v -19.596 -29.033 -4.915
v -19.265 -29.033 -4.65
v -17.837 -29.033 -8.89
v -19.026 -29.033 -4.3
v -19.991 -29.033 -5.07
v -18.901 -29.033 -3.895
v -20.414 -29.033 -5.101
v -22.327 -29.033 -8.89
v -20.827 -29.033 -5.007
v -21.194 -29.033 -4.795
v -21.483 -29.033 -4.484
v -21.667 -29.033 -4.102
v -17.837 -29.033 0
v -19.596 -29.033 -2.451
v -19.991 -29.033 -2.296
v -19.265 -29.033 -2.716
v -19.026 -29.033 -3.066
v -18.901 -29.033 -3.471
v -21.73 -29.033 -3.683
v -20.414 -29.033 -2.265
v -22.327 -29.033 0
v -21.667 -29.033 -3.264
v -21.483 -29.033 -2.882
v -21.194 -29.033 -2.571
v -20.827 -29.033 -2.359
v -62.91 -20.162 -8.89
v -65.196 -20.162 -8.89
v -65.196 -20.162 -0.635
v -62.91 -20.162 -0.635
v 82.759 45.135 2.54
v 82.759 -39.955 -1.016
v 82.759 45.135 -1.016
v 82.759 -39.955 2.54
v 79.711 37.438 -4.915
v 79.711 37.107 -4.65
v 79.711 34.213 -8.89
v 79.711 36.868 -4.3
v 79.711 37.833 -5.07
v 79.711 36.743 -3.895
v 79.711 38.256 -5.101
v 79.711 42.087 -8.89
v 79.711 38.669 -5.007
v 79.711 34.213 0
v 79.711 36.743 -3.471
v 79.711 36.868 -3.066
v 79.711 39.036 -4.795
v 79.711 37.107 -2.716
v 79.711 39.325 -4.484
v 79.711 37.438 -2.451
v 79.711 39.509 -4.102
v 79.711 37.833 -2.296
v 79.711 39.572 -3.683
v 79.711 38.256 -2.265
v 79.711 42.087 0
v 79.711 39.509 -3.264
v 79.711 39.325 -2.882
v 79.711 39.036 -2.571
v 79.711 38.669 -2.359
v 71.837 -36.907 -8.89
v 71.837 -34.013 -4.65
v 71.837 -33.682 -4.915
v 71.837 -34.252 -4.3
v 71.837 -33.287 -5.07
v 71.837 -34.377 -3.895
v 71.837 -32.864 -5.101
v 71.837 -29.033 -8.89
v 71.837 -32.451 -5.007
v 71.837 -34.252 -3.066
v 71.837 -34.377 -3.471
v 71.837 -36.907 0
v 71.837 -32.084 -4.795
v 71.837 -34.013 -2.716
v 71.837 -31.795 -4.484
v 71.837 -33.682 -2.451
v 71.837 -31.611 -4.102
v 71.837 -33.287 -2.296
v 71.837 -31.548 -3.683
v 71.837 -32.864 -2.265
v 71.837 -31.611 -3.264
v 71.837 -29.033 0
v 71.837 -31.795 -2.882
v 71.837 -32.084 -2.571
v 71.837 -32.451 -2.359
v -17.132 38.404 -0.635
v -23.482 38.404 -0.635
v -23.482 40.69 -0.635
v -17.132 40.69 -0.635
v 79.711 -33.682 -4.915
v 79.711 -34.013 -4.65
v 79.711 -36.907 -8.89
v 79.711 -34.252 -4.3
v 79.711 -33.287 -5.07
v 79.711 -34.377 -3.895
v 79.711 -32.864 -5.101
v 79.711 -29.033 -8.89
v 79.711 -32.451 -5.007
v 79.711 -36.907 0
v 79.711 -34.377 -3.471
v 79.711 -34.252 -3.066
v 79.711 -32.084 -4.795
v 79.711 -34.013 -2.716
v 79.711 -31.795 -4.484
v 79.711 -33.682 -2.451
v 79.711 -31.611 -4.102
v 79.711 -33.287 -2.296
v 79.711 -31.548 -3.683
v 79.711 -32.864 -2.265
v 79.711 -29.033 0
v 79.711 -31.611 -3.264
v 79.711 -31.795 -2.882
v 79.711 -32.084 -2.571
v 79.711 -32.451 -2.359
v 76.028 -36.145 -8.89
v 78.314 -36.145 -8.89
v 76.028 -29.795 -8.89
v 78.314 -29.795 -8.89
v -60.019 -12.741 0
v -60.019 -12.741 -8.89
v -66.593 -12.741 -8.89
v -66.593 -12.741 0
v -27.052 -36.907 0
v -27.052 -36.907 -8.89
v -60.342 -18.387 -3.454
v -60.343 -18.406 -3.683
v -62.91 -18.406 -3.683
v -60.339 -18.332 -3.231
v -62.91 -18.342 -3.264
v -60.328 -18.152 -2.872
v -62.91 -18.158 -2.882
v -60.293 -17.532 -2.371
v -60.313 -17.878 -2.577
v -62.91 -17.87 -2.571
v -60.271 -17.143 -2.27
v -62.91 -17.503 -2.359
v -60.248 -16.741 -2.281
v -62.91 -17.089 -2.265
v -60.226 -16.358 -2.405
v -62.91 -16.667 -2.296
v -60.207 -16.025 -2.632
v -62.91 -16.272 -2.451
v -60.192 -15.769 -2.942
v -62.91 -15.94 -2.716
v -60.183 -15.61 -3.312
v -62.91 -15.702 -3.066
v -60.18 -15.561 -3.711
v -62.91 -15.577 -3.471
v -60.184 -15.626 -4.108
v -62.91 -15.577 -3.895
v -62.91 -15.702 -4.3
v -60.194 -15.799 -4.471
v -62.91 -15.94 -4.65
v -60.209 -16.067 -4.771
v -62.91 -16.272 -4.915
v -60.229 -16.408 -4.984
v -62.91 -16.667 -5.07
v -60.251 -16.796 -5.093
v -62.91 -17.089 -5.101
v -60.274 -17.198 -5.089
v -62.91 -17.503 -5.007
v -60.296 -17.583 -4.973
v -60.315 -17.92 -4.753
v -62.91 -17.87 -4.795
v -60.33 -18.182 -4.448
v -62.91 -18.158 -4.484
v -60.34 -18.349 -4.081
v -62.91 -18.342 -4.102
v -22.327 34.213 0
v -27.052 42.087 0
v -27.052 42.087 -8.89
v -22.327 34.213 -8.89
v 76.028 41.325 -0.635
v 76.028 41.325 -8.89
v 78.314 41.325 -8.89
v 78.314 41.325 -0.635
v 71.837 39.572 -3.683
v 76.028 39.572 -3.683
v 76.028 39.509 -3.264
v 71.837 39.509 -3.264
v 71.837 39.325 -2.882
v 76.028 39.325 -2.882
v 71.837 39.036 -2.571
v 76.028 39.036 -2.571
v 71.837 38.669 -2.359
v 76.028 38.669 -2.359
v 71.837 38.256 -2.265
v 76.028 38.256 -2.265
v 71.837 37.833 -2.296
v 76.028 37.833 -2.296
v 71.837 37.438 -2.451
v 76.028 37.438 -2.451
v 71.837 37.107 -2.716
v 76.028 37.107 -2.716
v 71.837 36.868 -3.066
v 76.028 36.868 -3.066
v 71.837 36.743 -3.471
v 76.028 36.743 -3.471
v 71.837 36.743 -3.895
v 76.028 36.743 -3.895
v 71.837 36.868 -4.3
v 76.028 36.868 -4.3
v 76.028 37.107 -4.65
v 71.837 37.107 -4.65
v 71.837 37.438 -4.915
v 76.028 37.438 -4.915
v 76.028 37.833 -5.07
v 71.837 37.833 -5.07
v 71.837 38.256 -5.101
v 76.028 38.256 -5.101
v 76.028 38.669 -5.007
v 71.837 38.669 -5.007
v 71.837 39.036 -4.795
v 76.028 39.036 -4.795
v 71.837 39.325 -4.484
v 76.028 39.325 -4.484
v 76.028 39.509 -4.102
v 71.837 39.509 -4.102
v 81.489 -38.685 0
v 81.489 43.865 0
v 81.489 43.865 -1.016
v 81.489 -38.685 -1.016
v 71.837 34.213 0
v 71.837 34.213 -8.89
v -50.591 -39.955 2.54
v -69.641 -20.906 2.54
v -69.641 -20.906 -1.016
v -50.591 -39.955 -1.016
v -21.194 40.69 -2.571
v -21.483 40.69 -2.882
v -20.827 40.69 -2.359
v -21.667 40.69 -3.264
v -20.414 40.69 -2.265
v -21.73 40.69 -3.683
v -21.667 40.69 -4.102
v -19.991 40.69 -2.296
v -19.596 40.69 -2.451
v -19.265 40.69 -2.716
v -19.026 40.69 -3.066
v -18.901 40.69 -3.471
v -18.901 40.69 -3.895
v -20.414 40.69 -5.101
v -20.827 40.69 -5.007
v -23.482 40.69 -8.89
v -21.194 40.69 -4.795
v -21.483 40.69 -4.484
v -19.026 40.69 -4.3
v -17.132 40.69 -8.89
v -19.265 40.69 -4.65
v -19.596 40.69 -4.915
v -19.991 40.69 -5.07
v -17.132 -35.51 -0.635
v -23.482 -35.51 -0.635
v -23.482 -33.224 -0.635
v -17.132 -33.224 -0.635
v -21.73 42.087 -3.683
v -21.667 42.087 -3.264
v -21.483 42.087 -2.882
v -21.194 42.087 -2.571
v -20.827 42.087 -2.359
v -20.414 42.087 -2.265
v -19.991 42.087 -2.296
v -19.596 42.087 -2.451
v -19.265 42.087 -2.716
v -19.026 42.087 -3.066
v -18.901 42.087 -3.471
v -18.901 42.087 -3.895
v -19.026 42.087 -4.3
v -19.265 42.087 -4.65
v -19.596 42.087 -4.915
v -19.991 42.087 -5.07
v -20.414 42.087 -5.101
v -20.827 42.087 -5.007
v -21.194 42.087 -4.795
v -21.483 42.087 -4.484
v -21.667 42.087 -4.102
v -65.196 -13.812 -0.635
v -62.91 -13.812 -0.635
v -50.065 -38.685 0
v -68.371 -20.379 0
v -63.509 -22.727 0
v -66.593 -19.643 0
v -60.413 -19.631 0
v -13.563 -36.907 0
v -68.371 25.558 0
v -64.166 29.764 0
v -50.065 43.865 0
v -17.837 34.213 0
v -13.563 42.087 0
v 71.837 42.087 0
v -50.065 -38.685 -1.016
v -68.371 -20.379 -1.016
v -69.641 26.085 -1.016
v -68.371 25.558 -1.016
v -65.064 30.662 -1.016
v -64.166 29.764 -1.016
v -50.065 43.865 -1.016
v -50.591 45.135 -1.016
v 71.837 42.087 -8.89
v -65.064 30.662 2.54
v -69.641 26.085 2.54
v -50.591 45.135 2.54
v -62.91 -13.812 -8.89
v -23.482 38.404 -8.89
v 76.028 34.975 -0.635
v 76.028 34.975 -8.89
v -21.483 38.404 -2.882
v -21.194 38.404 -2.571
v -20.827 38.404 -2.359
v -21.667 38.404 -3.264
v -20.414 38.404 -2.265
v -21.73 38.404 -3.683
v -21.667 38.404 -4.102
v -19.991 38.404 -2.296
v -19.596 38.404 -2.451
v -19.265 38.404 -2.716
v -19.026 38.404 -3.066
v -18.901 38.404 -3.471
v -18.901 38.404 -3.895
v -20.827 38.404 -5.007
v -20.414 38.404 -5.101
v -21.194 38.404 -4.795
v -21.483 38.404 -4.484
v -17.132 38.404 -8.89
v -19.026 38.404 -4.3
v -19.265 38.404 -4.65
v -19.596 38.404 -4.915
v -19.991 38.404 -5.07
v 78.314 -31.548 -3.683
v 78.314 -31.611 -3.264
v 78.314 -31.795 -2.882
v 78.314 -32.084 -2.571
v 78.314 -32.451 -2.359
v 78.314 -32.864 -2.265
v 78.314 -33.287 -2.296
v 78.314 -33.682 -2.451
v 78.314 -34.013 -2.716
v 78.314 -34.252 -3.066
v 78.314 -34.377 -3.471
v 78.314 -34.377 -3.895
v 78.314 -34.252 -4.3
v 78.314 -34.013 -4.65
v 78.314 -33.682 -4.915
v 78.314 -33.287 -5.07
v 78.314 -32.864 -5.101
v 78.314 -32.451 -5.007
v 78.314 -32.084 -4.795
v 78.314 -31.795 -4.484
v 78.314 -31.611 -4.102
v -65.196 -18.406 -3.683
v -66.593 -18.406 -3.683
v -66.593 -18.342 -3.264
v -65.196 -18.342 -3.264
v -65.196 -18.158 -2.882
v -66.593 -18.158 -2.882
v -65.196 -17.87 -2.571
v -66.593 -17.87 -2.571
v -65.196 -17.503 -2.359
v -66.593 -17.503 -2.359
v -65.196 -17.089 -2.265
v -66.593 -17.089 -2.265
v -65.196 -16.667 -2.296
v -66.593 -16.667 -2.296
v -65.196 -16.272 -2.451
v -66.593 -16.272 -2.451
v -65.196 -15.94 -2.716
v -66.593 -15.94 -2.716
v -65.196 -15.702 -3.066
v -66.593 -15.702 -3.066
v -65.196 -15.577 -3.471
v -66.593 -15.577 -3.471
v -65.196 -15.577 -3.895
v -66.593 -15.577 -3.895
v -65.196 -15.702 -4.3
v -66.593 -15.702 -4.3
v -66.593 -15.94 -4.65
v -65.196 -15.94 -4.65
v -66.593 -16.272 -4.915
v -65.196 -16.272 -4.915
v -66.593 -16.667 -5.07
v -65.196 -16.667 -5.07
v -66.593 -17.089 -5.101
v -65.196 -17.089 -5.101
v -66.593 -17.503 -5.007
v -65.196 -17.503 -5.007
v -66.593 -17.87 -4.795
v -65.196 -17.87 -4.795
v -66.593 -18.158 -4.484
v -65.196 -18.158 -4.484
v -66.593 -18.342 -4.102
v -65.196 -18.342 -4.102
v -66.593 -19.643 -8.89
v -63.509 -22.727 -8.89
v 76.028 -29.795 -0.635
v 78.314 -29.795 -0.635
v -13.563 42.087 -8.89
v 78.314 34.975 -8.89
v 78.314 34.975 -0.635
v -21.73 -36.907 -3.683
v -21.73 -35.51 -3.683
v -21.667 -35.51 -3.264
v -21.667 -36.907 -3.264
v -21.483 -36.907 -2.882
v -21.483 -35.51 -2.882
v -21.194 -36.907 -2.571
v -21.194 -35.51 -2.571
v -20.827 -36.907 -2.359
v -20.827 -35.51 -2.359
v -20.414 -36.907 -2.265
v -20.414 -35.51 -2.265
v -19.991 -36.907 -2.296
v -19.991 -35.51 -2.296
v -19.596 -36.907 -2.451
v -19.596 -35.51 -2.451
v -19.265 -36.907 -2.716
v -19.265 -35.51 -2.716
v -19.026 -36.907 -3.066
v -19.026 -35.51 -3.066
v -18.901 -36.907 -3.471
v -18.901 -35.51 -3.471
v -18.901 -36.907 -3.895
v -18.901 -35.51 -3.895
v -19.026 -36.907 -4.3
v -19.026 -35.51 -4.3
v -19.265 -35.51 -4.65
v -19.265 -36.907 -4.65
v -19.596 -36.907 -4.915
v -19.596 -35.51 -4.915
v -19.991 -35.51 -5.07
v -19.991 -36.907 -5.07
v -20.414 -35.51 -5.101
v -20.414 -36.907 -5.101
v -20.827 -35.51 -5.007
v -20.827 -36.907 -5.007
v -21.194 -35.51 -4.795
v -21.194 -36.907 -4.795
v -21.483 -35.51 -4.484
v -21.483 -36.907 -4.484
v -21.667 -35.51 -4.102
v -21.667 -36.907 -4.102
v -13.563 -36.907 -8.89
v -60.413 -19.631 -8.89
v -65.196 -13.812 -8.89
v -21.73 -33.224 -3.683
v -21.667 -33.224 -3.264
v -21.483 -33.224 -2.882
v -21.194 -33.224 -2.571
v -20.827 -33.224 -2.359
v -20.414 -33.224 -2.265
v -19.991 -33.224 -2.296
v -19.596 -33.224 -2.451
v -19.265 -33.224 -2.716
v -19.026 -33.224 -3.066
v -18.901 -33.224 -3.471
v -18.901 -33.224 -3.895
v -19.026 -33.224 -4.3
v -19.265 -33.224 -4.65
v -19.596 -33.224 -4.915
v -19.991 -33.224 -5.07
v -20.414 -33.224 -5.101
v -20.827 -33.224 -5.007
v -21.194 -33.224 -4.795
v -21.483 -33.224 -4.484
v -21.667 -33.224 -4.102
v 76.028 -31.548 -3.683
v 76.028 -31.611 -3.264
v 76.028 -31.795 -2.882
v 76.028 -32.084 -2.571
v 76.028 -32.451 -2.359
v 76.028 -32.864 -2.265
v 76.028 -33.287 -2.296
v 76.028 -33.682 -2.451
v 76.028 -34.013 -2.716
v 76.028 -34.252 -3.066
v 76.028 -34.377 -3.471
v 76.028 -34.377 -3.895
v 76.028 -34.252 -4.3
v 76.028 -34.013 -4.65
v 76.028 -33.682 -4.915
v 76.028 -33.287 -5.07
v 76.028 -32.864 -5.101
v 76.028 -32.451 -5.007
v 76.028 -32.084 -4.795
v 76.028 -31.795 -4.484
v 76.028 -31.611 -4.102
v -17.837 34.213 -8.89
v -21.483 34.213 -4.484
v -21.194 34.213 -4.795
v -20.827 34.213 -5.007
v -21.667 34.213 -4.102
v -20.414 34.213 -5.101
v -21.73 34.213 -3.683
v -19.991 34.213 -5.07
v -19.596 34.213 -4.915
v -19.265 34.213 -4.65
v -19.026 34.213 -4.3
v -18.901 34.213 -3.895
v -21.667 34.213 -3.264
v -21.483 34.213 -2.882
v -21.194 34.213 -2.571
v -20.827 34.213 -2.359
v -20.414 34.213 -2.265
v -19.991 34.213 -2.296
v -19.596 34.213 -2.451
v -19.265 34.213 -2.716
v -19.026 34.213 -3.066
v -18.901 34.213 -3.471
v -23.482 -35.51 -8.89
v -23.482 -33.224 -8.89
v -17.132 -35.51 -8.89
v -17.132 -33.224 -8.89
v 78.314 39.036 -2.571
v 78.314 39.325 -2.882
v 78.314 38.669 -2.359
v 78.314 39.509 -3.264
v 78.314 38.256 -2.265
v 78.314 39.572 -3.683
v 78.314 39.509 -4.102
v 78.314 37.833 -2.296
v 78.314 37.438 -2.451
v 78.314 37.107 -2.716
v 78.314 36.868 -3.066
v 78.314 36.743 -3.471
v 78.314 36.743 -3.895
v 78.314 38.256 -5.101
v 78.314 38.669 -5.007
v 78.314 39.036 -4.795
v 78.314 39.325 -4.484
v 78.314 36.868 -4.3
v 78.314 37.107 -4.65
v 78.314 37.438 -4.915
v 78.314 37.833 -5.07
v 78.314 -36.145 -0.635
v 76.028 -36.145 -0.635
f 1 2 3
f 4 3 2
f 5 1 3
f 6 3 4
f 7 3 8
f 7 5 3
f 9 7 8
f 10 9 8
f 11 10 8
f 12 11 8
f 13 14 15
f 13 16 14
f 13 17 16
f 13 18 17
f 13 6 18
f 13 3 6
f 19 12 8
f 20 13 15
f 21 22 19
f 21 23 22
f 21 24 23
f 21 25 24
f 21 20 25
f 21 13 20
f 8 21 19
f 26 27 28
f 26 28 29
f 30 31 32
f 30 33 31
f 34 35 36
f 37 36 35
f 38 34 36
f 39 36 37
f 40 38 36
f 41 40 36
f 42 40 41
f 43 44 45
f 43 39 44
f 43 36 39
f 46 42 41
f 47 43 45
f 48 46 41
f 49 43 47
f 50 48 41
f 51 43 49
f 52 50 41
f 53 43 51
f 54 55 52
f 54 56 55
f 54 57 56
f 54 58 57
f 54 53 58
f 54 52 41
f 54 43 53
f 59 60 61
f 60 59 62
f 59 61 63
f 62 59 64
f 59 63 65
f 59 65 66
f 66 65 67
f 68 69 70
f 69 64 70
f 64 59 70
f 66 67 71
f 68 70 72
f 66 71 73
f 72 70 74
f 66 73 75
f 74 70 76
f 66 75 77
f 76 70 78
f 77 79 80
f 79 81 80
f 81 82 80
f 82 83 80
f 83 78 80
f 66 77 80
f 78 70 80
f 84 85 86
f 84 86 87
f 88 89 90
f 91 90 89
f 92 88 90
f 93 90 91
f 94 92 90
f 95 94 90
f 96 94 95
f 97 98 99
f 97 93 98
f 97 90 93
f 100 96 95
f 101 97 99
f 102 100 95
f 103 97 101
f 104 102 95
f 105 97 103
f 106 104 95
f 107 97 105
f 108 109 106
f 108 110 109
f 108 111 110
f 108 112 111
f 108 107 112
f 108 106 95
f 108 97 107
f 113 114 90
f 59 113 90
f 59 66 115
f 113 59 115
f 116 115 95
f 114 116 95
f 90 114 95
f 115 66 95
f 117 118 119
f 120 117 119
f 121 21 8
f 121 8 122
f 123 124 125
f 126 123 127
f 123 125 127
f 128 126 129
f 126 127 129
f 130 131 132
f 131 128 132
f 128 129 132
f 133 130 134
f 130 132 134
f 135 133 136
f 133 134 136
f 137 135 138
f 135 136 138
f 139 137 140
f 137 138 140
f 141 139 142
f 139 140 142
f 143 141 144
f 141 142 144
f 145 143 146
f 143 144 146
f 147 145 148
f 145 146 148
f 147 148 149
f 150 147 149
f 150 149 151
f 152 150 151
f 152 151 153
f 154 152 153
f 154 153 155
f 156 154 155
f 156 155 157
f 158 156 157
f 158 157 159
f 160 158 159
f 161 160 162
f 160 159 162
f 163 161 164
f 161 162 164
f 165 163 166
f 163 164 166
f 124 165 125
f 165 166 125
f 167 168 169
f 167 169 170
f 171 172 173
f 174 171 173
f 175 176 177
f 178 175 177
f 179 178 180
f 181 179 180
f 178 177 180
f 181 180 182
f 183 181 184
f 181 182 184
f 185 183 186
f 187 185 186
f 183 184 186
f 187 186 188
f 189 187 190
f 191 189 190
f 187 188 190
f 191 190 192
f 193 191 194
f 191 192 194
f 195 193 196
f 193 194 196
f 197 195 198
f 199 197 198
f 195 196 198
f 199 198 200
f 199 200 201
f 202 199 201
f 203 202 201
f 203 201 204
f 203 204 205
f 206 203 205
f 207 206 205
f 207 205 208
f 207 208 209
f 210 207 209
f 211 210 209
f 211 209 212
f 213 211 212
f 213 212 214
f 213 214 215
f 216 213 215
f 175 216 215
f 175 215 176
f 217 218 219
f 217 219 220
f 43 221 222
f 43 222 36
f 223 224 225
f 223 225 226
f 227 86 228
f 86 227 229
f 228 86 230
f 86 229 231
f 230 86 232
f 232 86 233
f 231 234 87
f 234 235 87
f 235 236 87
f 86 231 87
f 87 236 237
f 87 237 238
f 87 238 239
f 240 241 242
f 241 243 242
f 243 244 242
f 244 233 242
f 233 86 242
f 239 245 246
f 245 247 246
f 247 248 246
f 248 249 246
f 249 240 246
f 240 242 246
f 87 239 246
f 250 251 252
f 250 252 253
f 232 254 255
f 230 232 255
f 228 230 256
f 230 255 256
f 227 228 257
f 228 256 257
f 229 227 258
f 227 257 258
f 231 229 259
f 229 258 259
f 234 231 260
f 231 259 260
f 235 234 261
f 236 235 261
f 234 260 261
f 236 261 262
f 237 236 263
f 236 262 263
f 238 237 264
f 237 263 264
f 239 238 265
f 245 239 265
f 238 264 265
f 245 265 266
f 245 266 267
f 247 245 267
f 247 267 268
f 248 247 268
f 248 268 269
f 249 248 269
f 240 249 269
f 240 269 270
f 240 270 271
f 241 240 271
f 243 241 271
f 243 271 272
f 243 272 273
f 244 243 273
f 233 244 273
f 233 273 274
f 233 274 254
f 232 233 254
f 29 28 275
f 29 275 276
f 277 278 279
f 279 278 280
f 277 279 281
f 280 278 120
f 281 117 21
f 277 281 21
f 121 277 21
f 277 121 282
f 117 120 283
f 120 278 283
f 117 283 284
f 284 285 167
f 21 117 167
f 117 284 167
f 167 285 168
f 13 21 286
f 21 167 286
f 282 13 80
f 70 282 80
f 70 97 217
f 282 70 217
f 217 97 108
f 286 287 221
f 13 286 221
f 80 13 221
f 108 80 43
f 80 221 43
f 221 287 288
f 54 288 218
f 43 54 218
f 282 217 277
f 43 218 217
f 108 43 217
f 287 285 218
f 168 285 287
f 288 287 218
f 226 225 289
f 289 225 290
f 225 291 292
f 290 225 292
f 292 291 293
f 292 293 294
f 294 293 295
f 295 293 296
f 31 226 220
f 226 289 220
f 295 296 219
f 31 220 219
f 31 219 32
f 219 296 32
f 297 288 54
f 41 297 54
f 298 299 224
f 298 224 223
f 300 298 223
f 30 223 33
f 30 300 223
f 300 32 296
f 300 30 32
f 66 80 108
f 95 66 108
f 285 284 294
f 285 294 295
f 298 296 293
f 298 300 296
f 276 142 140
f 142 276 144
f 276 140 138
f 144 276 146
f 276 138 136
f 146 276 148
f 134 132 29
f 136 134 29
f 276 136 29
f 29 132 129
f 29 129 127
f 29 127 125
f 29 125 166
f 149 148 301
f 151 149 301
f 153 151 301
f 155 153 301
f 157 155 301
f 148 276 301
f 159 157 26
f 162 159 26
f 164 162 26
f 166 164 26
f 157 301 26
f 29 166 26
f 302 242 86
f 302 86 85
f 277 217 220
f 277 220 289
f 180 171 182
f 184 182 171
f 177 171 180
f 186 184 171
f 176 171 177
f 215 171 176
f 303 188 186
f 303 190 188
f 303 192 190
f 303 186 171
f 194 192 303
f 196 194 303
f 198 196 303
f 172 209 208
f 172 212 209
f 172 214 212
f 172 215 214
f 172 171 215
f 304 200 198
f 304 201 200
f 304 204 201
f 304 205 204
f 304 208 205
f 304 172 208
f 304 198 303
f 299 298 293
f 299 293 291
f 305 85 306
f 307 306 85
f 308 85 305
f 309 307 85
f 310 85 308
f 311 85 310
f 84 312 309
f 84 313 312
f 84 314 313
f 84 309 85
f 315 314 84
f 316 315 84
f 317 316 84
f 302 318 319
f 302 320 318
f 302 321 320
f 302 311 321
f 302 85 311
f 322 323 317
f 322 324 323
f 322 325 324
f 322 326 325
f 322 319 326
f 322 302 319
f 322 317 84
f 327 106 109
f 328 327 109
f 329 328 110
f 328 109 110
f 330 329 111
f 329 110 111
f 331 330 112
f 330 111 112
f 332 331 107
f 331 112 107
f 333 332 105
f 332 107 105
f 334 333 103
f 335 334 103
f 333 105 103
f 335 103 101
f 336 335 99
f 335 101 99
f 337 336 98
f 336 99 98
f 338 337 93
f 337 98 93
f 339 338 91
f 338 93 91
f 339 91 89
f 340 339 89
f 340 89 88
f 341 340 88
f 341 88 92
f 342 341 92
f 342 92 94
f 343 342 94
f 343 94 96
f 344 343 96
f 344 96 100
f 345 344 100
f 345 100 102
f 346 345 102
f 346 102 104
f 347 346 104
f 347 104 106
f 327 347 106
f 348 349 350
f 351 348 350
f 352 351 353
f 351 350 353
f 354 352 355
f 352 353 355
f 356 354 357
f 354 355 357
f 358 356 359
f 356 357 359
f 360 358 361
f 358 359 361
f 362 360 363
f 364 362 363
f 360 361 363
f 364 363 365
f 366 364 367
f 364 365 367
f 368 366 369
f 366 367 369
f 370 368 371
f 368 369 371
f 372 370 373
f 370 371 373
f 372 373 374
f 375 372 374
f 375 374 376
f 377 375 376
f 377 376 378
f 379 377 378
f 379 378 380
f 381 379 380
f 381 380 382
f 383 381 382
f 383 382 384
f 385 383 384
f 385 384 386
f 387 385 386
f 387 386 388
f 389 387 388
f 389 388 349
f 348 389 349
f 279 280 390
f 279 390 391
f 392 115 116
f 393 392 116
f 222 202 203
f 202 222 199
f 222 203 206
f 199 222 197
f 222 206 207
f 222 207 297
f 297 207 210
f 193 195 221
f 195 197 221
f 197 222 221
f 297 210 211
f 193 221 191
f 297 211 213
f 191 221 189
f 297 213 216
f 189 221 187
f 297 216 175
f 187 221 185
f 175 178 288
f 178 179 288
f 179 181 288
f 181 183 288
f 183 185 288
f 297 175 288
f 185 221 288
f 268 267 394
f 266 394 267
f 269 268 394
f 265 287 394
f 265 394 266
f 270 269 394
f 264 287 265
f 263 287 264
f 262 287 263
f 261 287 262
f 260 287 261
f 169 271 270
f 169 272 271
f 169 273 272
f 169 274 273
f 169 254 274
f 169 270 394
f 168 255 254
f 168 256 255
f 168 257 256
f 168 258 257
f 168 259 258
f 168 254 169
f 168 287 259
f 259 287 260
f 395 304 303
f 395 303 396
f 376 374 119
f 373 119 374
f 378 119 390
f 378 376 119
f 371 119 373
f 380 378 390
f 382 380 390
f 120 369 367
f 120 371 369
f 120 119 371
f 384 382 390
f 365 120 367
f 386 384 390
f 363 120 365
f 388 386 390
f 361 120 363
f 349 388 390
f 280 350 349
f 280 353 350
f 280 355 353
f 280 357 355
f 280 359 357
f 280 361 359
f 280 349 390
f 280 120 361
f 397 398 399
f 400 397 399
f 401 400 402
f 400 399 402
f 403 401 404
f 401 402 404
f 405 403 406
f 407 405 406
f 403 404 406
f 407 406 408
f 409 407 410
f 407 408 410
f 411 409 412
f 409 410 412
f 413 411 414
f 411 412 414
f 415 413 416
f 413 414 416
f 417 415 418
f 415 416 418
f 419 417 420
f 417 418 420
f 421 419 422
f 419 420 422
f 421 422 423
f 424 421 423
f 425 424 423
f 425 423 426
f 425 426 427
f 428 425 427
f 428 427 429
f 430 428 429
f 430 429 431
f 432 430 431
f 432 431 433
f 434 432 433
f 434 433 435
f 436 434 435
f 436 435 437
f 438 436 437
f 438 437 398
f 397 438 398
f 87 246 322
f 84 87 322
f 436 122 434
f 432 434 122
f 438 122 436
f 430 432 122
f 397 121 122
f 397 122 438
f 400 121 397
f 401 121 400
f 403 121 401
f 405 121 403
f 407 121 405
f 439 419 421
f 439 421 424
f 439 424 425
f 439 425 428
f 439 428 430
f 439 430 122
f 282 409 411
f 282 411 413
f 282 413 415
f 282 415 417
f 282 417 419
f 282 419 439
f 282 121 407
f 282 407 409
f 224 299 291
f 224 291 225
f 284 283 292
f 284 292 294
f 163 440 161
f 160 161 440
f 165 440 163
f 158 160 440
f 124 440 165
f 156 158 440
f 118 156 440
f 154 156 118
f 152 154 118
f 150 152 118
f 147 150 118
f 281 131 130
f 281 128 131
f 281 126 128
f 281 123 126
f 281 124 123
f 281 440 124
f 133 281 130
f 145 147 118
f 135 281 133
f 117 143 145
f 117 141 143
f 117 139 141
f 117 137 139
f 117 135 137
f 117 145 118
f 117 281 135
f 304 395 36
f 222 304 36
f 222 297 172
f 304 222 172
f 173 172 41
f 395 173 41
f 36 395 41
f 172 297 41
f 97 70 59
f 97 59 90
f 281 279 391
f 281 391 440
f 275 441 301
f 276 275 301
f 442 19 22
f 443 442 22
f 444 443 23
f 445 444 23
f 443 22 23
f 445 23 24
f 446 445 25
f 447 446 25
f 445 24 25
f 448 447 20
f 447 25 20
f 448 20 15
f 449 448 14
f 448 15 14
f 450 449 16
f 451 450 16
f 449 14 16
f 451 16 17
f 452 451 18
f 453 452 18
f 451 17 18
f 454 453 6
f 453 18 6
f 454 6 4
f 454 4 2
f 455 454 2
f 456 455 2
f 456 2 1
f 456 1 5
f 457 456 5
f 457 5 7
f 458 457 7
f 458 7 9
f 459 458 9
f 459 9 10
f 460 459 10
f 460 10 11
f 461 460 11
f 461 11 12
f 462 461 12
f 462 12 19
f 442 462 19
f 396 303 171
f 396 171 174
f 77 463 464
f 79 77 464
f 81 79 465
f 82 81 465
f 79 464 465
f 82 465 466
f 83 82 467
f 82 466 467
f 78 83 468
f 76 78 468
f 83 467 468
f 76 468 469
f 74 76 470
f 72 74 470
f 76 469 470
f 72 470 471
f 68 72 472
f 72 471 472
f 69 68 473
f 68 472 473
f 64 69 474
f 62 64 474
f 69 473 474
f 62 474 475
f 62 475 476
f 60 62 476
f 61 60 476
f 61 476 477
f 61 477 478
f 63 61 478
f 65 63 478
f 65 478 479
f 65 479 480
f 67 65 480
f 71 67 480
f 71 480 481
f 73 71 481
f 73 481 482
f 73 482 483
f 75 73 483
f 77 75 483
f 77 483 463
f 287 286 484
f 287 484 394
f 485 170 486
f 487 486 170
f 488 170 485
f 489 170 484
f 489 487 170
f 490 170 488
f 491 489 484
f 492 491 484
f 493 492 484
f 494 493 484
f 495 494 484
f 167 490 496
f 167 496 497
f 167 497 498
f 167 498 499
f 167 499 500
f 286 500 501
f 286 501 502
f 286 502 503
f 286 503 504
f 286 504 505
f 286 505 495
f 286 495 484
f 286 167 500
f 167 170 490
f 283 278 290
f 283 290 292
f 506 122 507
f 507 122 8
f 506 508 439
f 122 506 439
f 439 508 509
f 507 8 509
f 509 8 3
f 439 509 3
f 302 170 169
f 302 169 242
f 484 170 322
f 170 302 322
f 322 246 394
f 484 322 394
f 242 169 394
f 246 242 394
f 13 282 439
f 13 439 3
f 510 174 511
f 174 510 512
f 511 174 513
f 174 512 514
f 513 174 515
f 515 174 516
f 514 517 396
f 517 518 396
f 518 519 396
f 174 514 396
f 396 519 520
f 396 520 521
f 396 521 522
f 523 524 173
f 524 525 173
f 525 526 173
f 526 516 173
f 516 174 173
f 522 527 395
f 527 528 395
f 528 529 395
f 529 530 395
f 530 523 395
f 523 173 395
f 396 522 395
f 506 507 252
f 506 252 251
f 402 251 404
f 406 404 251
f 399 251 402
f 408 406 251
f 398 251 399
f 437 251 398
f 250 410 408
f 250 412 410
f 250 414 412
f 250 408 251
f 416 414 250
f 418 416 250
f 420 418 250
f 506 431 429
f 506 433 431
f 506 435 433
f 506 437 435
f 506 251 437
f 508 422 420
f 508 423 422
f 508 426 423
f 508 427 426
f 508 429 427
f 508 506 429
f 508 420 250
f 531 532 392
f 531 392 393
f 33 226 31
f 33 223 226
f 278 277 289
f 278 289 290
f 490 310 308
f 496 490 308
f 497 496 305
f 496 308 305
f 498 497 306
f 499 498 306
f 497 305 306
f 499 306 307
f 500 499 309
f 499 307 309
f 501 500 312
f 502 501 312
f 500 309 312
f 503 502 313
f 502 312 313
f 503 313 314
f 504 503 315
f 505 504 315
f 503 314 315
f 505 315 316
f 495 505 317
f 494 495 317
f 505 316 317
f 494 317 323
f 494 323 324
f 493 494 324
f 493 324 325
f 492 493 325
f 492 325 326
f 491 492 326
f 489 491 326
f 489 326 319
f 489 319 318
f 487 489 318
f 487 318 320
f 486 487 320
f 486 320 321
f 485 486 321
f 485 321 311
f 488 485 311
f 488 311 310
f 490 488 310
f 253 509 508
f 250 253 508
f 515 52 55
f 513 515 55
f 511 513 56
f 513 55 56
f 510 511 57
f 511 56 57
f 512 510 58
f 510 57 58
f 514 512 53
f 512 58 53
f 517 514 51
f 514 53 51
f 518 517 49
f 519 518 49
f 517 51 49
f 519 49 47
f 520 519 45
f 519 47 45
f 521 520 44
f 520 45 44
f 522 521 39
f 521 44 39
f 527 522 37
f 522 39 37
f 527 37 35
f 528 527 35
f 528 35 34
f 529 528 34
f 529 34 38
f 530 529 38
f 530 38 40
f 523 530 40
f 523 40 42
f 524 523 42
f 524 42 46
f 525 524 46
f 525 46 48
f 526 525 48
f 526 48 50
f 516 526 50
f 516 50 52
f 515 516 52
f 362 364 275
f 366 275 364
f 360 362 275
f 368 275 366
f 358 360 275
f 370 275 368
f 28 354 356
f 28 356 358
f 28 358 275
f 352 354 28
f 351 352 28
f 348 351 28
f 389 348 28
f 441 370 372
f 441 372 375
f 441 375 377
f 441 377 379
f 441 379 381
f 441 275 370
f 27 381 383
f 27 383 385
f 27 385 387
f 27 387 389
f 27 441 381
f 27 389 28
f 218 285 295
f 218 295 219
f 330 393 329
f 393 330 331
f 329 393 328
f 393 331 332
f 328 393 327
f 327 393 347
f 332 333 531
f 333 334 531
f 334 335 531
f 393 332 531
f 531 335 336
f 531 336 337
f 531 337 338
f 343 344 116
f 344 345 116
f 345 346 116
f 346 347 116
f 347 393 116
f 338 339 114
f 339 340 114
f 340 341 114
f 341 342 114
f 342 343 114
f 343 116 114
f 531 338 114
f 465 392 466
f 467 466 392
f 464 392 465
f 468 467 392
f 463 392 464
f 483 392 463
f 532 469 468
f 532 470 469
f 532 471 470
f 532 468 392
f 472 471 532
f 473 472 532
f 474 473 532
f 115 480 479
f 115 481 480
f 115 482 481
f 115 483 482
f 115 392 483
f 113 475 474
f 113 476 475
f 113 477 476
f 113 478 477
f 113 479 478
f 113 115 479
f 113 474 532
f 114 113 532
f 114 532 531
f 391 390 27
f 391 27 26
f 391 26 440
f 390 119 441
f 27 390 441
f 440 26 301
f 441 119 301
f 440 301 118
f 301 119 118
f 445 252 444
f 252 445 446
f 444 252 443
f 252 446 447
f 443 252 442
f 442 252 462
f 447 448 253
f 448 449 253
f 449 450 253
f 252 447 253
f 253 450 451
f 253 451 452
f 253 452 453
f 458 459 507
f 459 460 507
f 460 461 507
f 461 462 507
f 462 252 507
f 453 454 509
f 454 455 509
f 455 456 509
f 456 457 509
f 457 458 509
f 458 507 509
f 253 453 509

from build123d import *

# Parameters (mm, degrees)
F0_W      = 7.8739928325
F0_H      = 7.8739928325
F1_DEPTH  = 2.54
F2_DEPTH  = 1.016
F3_DEPTH  = 8.89
F8_W      = 2.286
F8_H      = 6.35
F7_W      = 2.286
F7_H      = 6.35
F4_W      = 6.35
F4_H      = 2.286
F5_W      = 2.286
F5_H      = 6.35
F6_W      = 6.35
F6_H      = 2.286
F9_DEPTH  = 8.255
F10_R     = 1.4224
F11_DEPTH = 101.6
F12_R     = 1.4224
F13_R     = 1.4224
F14_DEPTH = 25.4
F15_R     = 1.4224
F16_DEPTH = 25.4


# Not quite as in the source:
# - a feature names something its author has since deleted; it is built from what else it names


with BuildPart() as f1:
    # F0 (on Top) → F1 (new body)
    with BuildSketch(Plane.XY):
        Polygon((-50.5911594971, 45.1345390935), (-65.0638575705, 30.6618410202), (-69.6408525109, 26.0848460797), (-69.6408525109, 9.5127671957), (-69.6408525109, -20.9057678927), (-62.6880467633, -27.8585736403), (-50.5911594971, -39.9554609065), (82.7588405029, -39.9554609065), (82.7588405029, -17.0967224985), (82.7588405029, 43.8645390935), (82.7588405029, 45.1345390935), (33.1444106996, 45.1345390935), (-20.2568043023, 45.1345390935), align=None)
        Polygon((-50.0651082729, -38.6854609065), (-68.3711594971, -20.3794096823), (-68.3711594971, 25.5584878693), (-64.1658319583, 29.763815408), (-50.0651082729, 43.8645390935), (81.4888405029, 43.8645390935), (81.4888405029, -38.6854609065), align=None, mode=Mode.SUBTRACT)
        Polygon((-68.3711594971, 25.5584878693), (-68.3711594971, -20.3794096823), (-50.0651082729, -38.6854609065), (81.4888405029, -38.6854609065), (81.4888405029, 43.8645390935), (-50.0651082729, 43.8645390935), (-64.1658319583, 29.763815408), align=None)
        Polygon((-13.562855112, -36.9074608927), (-27.0518330949, -36.9074608927), (-22.3274411258, -29.0334609202), (-17.8373202542, -29.0334609202), align=None, mode=Mode.SUBTRACT)
        Polygon((-66.5931594971, -19.6429379684), (-66.5931594971, -12.7413552397), (-60.0190392027, -12.7413552397), (-60.413067775, -19.6310556945), (-63.509054773, -22.7270426925), align=None, mode=Mode.SUBTRACT)
        with BuildLine():
            Line((-49.5390570487, -37.4154609065), (-61.7130058245, -25.2415121307))
            Line((-61.7130058245, -25.2415121307), (-58.120903376, -21.6494096823))
            Line((-58.120903376, -21.6494096823), (-56.9411594971, -12.2333584581))
            Line((-56.9411594971, -12.2333584581), (-56.9411594971, -9.6933584581))
            Line((-56.9411594971, -9.6933584581), (-67.1011594971, -9.6933584581))
            Line((-67.1011594971, -9.6933584581), (-67.1011594971, 25.0324366451))
            Line((-67.1011594971, 25.0324366451), (-49.5390570487, 42.5945390935))
            Line((-49.5390570487, 42.5945390935), (-33.3653066841, 42.5945390935))
            ThreePointArc((-33.3653066841, 42.5945390935), (-30.8623950498, 41.9351536832), (-29.0092406655, 40.128174271))
            Line((-29.0092406655, 40.128174271), (-25.1550660971, 33.7045390935))
            ThreePointArc((-25.1550660971, 33.7045390935), (-23.284234992, 31.8649136199), (-20.7556570459, 31.1645390935))
            Line((-20.7556570459, 31.1645390935), (-19.3944751483, 31.1645390935))
            ThreePointArc((-19.3944751483, 31.1645390935), (-16.8544751483, 31.8451300423), (-14.9950660971, 33.7045390935))
            Line((-14.9950660971, 33.7045390935), (-11.6110890868, 39.9381692669))
            ThreePointArc((-11.6110890868, 39.9381692669), (-9.7440488814, 41.8802258253), (-7.1465155593, 42.5945390935))
            Line((-7.1465155593, 42.5945390935), (67.5188405029, 42.5945390935))
            ThreePointArc((67.5188405029, 42.5945390935), (69.3148917271, 41.8505903177), (70.0588405029, 40.0545390935))
            Line((70.0588405029, 40.0545390935), (70.0588405029, 32.4345390935))
            Line((70.0588405029, 32.4345390935), (77.6788405029, 32.4345390935))
            ThreePointArc((77.6788405029, 32.4345390935), (79.4748917271, 31.6905903177), (80.2188405029, 29.8945390935))
            Line((80.2188405029, 29.8945390935), (80.2188405029, -24.7154609065))
            ThreePointArc((80.2188405029, -24.7154609065), (79.4748917271, -26.5115121307), (77.6788405029, -27.2554609065))
            Line((77.6788405029, -27.2554609065), (70.0588405029, -27.2554609065))
            Line((70.0588405029, -27.2554609065), (70.0588405029, -34.8754609065))
            ThreePointArc((70.0588405029, -34.8754609065), (69.3148917271, -36.6715121307), (67.5188405029, -37.4154609065))
            Line((67.5188405029, -37.4154609065), (-7.1465155593, -37.4154609065))
            ThreePointArc((-7.1465155593, -37.4154609065), (-9.7440488814, -36.7011476383), (-11.6110890868, -34.7590910799))
            Line((-11.6110890868, -34.7590910799), (-14.9950660971, -28.5254609065))
            ThreePointArc((-14.9950660971, -28.5254609065), (-16.8544751483, -26.6660518553), (-19.3944751483, -25.9854609065))
            Line((-19.3944751483, -25.9854609065), (-20.7556570459, -25.9854609065))
            ThreePointArc((-20.7556570459, -25.9854609065), (-23.284234992, -26.6858354329), (-25.1550660971, -28.5254609065))
            Line((-25.1550660971, -28.5254609065), (-29.0092406655, -34.949096084))
            ThreePointArc((-29.0092406655, -34.949096084), (-30.8623950498, -36.7560754962), (-33.3653066841, -37.4154609065))
            Line((-33.3653066841, -37.4154609065), (-49.5390570487, -37.4154609065))
        make_face(mode=Mode.SUBTRACT)
        with Locations((75.7738405029, -32.9704609065)):
            Rectangle(F0_W, F0_H, mode=Mode.SUBTRACT)
        Polygon((-27.0518310596, 42.0865379274), (-13.5628570488, 42.0865379274), (-17.8373209399, 34.2125402596), (-22.3274404733, 34.2125402596), align=None, mode=Mode.SUBTRACT)
        with Locations((75.7738405029, 38.1495390935)):
            Rectangle(F0_W, F0_H, mode=Mode.SUBTRACT)
        with BuildLine():
            Line((-58.120903376, -21.6494096823), (-61.7130058245, -25.2415121307))
            Line((-61.7130058245, -25.2415121307), (-49.5390570487, -37.4154609065))
            Line((-49.5390570487, -37.4154609065), (-33.3653066841, -37.4154609065))
            ThreePointArc((-33.3653066841, -37.4154609065), (-30.8623950498, -36.7560754962), (-29.0092406655, -34.949096084))
            Line((-29.0092406655, -34.949096084), (-25.1550660971, -28.5254609065))
            ThreePointArc((-25.1550660971, -28.5254609065), (-23.284234992, -26.6858354329), (-20.7556570459, -25.9854609065))
            Line((-20.7556570459, -25.9854609065), (-19.3944751483, -25.9854609065))
            ThreePointArc((-19.3944751483, -25.9854609065), (-16.8544751483, -26.6660518553), (-14.9950660971, -28.5254609065))
            Line((-14.9950660971, -28.5254609065), (-11.6110890868, -34.7590910799))
            ThreePointArc((-11.6110890868, -34.7590910799), (-9.7440488814, -36.7011476383), (-7.1465155593, -37.4154609065))
            Line((-7.1465155593, -37.4154609065), (67.5188405029, -37.4154609065))
            ThreePointArc((67.5188405029, -37.4154609065), (69.3148917271, -36.6715121307), (70.0588405029, -34.8754609065))
            Line((70.0588405029, -34.8754609065), (70.0588405029, -27.2554609065))
            Line((70.0588405029, -27.2554609065), (77.6788405029, -27.2554609065))
            ThreePointArc((77.6788405029, -27.2554609065), (79.4748917271, -26.5115121307), (80.2188405029, -24.7154609065))
            Line((80.2188405029, -24.7154609065), (80.2188405029, 29.8945390935))
            ThreePointArc((80.2188405029, 29.8945390935), (79.4748917271, 31.6905903177), (77.6788405029, 32.4345390935))
            Line((77.6788405029, 32.4345390935), (70.0588405029, 32.4345390935))
            Line((70.0588405029, 32.4345390935), (70.0588405029, 40.0545390935))
            ThreePointArc((70.0588405029, 40.0545390935), (69.3148917271, 41.8505903177), (67.5188405029, 42.5945390935))
            Line((67.5188405029, 42.5945390935), (-7.1465155593, 42.5945390935))
            ThreePointArc((-7.1465155593, 42.5945390935), (-9.7440488814, 41.8802258253), (-11.6110890868, 39.9381692669))
            Line((-11.6110890868, 39.9381692669), (-14.9950660971, 33.7045390935))
            ThreePointArc((-14.9950660971, 33.7045390935), (-16.8544751483, 31.8451300423), (-19.3944751483, 31.1645390935))
            Line((-19.3944751483, 31.1645390935), (-20.7556570459, 31.1645390935))
            ThreePointArc((-20.7556570459, 31.1645390935), (-23.284234992, 31.8649136199), (-25.1550660971, 33.7045390935))
            Line((-25.1550660971, 33.7045390935), (-29.0092406655, 40.128174271))
            ThreePointArc((-29.0092406655, 40.128174271), (-30.8623950498, 41.9351536832), (-33.3653066841, 42.5945390935))
            Line((-33.3653066841, 42.5945390935), (-49.5390570487, 42.5945390935))
            Line((-49.5390570487, 42.5945390935), (-67.1011594971, 25.0324366451))
            Line((-67.1011594971, 25.0324366451), (-67.1011594971, -9.6933584581))
            Line((-67.1011594971, -9.6933584581), (-56.9411594971, -9.6933584581))
            Line((-56.9411594971, -9.6933584581), (-56.9411594971, -12.2333584581))
            Line((-56.9411594971, -12.2333584581), (-58.120903376, -21.6494096823))
        make_face()
        Polygon((-22.3274411258, -29.0334609202), (-27.0518330949, -36.9074608927), (-13.562855112, -36.9074608927), (-17.8373202542, -29.0334609202), align=None)
        Polygon((-17.8373209399, 34.2125402596), (-13.5628570488, 42.0865379274), (-27.0518310596, 42.0865379274), (-22.3274404733, 34.2125402596), align=None)
        with Locations((75.7738405029, -32.9704609065)):
            Rectangle(F0_W, F0_H)
        with Locations((75.7738405029, 38.1495390935)):
            Rectangle(F0_W, F0_H)
        Polygon((-60.0190392027, -12.7413552397), (-66.5931594971, -12.7413552397), (-66.5931594971, -19.6429379684), (-63.509054773, -22.7270426925), (-60.413067775, -19.6310556945), align=None)
    extrude(amount=F1_DEPTH)

    # F0 (on Top) → F2 (join)
    with BuildSketch(Plane.XY):
        Polygon((-50.5911594971, 45.1345390935), (-65.0638575705, 30.6618410202), (-69.6408525109, 26.0848460797), (-69.6408525109, 9.5127671957), (-69.6408525109, -20.9057678927), (-62.6880467633, -27.8585736403), (-50.5911594971, -39.9554609065), (82.7588405029, -39.9554609065), (82.7588405029, -17.0967224985), (82.7588405029, 43.8645390935), (82.7588405029, 45.1345390935), (33.1444106996, 45.1345390935), (-20.2568043023, 45.1345390935), align=None)
        Polygon((-50.0651082729, -38.6854609065), (-68.3711594971, -20.3794096823), (-68.3711594971, 25.5584878693), (-64.1658319583, 29.763815408), (-50.0651082729, 43.8645390935), (81.4888405029, 43.8645390935), (81.4888405029, -38.6854609065), align=None, mode=Mode.SUBTRACT)
    extrude(amount=-F2_DEPTH)

    # F0 (on Top) → F3 (join)
    with BuildSketch(Plane.XY):
        Polygon((-17.8373209399, 34.2125402596), (-13.5628570488, 42.0865379274), (-27.0518310596, 42.0865379274), (-22.3274404733, 34.2125402596), align=None)
        Polygon((-22.3274411258, -29.0334609202), (-27.0518330949, -36.9074608927), (-13.562855112, -36.9074608927), (-17.8373202542, -29.0334609202), align=None)
        Polygon((-60.0190392027, -12.7413552397), (-66.5931594971, -12.7413552397), (-66.5931594971, -19.6429379684), (-63.509054773, -22.7270426925), (-60.413067775, -19.6310556945), align=None)
        with Locations((75.7738405029, -32.9704609065)):
            Rectangle(F0_W, F0_H)
        with Locations((75.7738405029, 38.1495390935)):
            Rectangle(F0_W, F0_H)
    extrude(amount=-F3_DEPTH)

    # F8 (on face) + F7 (on face) + F4 (on face) + F5 (on face) + F6 (on face) → F9 (cut)
    with BuildSketch(Plane(origin=(0, 0, -8.89), x_dir=(1, 0, 0), z_dir=(0, 0, -1))):
        with Locations((77.1708369192, -38.1495390935)):
            Rectangle(F8_W, F8_H)
    with BuildSketch(Plane(origin=(0, 0, -8.89), x_dir=(1, 0, 0), z_dir=(0, 0, -1))):
        with Locations((77.1708369192, 32.9704609065)):
            Rectangle(F7_W, F7_H)
    with BuildSketch(Plane(origin=(0, 0, -8.89), x_dir=(1, 0, 0), z_dir=(0, 0, -1))):
        with Locations((-20.3073441034, 34.3674608927)):
            Rectangle(F4_W, F4_H)
    with BuildSketch(Plane(origin=(0, 0, -8.89), x_dir=(1, 0, 0), z_dir=(0, 0, -1))):
        with Locations((-64.0531594971, 16.9871170074)):
            Rectangle(F5_W, F5_H)
    with BuildSketch(Plane(origin=(0, 0, -8.89), x_dir=(1, 0, 0), z_dir=(0, 0, -1))):
        with Locations((-20.3073440542, -39.5465379274)):
            Rectangle(F6_W, F6_H)
    extrude(amount=-F9_DEPTH, mode=Mode.SUBTRACT)

    # F10 (on face) → F11 (cut)
    with BuildSketch(Plane(origin=(0, 42.0865379274, 0), x_dir=(-1, 0, 0), z_dir=(0, 1, 0))):
        with Locations((20.3073440542, -3.683)):
            Circle(F10_R)
    extrude(amount=-F11_DEPTH, mode=Mode.SUBTRACT)

    # F12 (on face) + F13 (on face) → F14 (cut)
    with BuildSketch(Plane.YZ.offset(79.7108369192)):
        with Locations((38.1495390935, -3.683)):
            Circle(F12_R)
    with BuildSketch(Plane.YZ.offset(79.7108369192)):
        with Locations((-32.9704609065, -3.683)):
            Circle(F13_R)
    extrude(amount=-F14_DEPTH, mode=Mode.SUBTRACT)

    # F15 (on face) → F16 (cut)
    with BuildSketch(Plane(origin=(-66.5931594971, 0, 0), x_dir=(0, -1, 0), z_dir=(-1, 0, 0))):
        with Locations((16.9831552397, -3.683)):
            Circle(F15_R)
    extrude(amount=-F16_DEPTH, mode=Mode.SUBTRACT)


solid = f1.part
